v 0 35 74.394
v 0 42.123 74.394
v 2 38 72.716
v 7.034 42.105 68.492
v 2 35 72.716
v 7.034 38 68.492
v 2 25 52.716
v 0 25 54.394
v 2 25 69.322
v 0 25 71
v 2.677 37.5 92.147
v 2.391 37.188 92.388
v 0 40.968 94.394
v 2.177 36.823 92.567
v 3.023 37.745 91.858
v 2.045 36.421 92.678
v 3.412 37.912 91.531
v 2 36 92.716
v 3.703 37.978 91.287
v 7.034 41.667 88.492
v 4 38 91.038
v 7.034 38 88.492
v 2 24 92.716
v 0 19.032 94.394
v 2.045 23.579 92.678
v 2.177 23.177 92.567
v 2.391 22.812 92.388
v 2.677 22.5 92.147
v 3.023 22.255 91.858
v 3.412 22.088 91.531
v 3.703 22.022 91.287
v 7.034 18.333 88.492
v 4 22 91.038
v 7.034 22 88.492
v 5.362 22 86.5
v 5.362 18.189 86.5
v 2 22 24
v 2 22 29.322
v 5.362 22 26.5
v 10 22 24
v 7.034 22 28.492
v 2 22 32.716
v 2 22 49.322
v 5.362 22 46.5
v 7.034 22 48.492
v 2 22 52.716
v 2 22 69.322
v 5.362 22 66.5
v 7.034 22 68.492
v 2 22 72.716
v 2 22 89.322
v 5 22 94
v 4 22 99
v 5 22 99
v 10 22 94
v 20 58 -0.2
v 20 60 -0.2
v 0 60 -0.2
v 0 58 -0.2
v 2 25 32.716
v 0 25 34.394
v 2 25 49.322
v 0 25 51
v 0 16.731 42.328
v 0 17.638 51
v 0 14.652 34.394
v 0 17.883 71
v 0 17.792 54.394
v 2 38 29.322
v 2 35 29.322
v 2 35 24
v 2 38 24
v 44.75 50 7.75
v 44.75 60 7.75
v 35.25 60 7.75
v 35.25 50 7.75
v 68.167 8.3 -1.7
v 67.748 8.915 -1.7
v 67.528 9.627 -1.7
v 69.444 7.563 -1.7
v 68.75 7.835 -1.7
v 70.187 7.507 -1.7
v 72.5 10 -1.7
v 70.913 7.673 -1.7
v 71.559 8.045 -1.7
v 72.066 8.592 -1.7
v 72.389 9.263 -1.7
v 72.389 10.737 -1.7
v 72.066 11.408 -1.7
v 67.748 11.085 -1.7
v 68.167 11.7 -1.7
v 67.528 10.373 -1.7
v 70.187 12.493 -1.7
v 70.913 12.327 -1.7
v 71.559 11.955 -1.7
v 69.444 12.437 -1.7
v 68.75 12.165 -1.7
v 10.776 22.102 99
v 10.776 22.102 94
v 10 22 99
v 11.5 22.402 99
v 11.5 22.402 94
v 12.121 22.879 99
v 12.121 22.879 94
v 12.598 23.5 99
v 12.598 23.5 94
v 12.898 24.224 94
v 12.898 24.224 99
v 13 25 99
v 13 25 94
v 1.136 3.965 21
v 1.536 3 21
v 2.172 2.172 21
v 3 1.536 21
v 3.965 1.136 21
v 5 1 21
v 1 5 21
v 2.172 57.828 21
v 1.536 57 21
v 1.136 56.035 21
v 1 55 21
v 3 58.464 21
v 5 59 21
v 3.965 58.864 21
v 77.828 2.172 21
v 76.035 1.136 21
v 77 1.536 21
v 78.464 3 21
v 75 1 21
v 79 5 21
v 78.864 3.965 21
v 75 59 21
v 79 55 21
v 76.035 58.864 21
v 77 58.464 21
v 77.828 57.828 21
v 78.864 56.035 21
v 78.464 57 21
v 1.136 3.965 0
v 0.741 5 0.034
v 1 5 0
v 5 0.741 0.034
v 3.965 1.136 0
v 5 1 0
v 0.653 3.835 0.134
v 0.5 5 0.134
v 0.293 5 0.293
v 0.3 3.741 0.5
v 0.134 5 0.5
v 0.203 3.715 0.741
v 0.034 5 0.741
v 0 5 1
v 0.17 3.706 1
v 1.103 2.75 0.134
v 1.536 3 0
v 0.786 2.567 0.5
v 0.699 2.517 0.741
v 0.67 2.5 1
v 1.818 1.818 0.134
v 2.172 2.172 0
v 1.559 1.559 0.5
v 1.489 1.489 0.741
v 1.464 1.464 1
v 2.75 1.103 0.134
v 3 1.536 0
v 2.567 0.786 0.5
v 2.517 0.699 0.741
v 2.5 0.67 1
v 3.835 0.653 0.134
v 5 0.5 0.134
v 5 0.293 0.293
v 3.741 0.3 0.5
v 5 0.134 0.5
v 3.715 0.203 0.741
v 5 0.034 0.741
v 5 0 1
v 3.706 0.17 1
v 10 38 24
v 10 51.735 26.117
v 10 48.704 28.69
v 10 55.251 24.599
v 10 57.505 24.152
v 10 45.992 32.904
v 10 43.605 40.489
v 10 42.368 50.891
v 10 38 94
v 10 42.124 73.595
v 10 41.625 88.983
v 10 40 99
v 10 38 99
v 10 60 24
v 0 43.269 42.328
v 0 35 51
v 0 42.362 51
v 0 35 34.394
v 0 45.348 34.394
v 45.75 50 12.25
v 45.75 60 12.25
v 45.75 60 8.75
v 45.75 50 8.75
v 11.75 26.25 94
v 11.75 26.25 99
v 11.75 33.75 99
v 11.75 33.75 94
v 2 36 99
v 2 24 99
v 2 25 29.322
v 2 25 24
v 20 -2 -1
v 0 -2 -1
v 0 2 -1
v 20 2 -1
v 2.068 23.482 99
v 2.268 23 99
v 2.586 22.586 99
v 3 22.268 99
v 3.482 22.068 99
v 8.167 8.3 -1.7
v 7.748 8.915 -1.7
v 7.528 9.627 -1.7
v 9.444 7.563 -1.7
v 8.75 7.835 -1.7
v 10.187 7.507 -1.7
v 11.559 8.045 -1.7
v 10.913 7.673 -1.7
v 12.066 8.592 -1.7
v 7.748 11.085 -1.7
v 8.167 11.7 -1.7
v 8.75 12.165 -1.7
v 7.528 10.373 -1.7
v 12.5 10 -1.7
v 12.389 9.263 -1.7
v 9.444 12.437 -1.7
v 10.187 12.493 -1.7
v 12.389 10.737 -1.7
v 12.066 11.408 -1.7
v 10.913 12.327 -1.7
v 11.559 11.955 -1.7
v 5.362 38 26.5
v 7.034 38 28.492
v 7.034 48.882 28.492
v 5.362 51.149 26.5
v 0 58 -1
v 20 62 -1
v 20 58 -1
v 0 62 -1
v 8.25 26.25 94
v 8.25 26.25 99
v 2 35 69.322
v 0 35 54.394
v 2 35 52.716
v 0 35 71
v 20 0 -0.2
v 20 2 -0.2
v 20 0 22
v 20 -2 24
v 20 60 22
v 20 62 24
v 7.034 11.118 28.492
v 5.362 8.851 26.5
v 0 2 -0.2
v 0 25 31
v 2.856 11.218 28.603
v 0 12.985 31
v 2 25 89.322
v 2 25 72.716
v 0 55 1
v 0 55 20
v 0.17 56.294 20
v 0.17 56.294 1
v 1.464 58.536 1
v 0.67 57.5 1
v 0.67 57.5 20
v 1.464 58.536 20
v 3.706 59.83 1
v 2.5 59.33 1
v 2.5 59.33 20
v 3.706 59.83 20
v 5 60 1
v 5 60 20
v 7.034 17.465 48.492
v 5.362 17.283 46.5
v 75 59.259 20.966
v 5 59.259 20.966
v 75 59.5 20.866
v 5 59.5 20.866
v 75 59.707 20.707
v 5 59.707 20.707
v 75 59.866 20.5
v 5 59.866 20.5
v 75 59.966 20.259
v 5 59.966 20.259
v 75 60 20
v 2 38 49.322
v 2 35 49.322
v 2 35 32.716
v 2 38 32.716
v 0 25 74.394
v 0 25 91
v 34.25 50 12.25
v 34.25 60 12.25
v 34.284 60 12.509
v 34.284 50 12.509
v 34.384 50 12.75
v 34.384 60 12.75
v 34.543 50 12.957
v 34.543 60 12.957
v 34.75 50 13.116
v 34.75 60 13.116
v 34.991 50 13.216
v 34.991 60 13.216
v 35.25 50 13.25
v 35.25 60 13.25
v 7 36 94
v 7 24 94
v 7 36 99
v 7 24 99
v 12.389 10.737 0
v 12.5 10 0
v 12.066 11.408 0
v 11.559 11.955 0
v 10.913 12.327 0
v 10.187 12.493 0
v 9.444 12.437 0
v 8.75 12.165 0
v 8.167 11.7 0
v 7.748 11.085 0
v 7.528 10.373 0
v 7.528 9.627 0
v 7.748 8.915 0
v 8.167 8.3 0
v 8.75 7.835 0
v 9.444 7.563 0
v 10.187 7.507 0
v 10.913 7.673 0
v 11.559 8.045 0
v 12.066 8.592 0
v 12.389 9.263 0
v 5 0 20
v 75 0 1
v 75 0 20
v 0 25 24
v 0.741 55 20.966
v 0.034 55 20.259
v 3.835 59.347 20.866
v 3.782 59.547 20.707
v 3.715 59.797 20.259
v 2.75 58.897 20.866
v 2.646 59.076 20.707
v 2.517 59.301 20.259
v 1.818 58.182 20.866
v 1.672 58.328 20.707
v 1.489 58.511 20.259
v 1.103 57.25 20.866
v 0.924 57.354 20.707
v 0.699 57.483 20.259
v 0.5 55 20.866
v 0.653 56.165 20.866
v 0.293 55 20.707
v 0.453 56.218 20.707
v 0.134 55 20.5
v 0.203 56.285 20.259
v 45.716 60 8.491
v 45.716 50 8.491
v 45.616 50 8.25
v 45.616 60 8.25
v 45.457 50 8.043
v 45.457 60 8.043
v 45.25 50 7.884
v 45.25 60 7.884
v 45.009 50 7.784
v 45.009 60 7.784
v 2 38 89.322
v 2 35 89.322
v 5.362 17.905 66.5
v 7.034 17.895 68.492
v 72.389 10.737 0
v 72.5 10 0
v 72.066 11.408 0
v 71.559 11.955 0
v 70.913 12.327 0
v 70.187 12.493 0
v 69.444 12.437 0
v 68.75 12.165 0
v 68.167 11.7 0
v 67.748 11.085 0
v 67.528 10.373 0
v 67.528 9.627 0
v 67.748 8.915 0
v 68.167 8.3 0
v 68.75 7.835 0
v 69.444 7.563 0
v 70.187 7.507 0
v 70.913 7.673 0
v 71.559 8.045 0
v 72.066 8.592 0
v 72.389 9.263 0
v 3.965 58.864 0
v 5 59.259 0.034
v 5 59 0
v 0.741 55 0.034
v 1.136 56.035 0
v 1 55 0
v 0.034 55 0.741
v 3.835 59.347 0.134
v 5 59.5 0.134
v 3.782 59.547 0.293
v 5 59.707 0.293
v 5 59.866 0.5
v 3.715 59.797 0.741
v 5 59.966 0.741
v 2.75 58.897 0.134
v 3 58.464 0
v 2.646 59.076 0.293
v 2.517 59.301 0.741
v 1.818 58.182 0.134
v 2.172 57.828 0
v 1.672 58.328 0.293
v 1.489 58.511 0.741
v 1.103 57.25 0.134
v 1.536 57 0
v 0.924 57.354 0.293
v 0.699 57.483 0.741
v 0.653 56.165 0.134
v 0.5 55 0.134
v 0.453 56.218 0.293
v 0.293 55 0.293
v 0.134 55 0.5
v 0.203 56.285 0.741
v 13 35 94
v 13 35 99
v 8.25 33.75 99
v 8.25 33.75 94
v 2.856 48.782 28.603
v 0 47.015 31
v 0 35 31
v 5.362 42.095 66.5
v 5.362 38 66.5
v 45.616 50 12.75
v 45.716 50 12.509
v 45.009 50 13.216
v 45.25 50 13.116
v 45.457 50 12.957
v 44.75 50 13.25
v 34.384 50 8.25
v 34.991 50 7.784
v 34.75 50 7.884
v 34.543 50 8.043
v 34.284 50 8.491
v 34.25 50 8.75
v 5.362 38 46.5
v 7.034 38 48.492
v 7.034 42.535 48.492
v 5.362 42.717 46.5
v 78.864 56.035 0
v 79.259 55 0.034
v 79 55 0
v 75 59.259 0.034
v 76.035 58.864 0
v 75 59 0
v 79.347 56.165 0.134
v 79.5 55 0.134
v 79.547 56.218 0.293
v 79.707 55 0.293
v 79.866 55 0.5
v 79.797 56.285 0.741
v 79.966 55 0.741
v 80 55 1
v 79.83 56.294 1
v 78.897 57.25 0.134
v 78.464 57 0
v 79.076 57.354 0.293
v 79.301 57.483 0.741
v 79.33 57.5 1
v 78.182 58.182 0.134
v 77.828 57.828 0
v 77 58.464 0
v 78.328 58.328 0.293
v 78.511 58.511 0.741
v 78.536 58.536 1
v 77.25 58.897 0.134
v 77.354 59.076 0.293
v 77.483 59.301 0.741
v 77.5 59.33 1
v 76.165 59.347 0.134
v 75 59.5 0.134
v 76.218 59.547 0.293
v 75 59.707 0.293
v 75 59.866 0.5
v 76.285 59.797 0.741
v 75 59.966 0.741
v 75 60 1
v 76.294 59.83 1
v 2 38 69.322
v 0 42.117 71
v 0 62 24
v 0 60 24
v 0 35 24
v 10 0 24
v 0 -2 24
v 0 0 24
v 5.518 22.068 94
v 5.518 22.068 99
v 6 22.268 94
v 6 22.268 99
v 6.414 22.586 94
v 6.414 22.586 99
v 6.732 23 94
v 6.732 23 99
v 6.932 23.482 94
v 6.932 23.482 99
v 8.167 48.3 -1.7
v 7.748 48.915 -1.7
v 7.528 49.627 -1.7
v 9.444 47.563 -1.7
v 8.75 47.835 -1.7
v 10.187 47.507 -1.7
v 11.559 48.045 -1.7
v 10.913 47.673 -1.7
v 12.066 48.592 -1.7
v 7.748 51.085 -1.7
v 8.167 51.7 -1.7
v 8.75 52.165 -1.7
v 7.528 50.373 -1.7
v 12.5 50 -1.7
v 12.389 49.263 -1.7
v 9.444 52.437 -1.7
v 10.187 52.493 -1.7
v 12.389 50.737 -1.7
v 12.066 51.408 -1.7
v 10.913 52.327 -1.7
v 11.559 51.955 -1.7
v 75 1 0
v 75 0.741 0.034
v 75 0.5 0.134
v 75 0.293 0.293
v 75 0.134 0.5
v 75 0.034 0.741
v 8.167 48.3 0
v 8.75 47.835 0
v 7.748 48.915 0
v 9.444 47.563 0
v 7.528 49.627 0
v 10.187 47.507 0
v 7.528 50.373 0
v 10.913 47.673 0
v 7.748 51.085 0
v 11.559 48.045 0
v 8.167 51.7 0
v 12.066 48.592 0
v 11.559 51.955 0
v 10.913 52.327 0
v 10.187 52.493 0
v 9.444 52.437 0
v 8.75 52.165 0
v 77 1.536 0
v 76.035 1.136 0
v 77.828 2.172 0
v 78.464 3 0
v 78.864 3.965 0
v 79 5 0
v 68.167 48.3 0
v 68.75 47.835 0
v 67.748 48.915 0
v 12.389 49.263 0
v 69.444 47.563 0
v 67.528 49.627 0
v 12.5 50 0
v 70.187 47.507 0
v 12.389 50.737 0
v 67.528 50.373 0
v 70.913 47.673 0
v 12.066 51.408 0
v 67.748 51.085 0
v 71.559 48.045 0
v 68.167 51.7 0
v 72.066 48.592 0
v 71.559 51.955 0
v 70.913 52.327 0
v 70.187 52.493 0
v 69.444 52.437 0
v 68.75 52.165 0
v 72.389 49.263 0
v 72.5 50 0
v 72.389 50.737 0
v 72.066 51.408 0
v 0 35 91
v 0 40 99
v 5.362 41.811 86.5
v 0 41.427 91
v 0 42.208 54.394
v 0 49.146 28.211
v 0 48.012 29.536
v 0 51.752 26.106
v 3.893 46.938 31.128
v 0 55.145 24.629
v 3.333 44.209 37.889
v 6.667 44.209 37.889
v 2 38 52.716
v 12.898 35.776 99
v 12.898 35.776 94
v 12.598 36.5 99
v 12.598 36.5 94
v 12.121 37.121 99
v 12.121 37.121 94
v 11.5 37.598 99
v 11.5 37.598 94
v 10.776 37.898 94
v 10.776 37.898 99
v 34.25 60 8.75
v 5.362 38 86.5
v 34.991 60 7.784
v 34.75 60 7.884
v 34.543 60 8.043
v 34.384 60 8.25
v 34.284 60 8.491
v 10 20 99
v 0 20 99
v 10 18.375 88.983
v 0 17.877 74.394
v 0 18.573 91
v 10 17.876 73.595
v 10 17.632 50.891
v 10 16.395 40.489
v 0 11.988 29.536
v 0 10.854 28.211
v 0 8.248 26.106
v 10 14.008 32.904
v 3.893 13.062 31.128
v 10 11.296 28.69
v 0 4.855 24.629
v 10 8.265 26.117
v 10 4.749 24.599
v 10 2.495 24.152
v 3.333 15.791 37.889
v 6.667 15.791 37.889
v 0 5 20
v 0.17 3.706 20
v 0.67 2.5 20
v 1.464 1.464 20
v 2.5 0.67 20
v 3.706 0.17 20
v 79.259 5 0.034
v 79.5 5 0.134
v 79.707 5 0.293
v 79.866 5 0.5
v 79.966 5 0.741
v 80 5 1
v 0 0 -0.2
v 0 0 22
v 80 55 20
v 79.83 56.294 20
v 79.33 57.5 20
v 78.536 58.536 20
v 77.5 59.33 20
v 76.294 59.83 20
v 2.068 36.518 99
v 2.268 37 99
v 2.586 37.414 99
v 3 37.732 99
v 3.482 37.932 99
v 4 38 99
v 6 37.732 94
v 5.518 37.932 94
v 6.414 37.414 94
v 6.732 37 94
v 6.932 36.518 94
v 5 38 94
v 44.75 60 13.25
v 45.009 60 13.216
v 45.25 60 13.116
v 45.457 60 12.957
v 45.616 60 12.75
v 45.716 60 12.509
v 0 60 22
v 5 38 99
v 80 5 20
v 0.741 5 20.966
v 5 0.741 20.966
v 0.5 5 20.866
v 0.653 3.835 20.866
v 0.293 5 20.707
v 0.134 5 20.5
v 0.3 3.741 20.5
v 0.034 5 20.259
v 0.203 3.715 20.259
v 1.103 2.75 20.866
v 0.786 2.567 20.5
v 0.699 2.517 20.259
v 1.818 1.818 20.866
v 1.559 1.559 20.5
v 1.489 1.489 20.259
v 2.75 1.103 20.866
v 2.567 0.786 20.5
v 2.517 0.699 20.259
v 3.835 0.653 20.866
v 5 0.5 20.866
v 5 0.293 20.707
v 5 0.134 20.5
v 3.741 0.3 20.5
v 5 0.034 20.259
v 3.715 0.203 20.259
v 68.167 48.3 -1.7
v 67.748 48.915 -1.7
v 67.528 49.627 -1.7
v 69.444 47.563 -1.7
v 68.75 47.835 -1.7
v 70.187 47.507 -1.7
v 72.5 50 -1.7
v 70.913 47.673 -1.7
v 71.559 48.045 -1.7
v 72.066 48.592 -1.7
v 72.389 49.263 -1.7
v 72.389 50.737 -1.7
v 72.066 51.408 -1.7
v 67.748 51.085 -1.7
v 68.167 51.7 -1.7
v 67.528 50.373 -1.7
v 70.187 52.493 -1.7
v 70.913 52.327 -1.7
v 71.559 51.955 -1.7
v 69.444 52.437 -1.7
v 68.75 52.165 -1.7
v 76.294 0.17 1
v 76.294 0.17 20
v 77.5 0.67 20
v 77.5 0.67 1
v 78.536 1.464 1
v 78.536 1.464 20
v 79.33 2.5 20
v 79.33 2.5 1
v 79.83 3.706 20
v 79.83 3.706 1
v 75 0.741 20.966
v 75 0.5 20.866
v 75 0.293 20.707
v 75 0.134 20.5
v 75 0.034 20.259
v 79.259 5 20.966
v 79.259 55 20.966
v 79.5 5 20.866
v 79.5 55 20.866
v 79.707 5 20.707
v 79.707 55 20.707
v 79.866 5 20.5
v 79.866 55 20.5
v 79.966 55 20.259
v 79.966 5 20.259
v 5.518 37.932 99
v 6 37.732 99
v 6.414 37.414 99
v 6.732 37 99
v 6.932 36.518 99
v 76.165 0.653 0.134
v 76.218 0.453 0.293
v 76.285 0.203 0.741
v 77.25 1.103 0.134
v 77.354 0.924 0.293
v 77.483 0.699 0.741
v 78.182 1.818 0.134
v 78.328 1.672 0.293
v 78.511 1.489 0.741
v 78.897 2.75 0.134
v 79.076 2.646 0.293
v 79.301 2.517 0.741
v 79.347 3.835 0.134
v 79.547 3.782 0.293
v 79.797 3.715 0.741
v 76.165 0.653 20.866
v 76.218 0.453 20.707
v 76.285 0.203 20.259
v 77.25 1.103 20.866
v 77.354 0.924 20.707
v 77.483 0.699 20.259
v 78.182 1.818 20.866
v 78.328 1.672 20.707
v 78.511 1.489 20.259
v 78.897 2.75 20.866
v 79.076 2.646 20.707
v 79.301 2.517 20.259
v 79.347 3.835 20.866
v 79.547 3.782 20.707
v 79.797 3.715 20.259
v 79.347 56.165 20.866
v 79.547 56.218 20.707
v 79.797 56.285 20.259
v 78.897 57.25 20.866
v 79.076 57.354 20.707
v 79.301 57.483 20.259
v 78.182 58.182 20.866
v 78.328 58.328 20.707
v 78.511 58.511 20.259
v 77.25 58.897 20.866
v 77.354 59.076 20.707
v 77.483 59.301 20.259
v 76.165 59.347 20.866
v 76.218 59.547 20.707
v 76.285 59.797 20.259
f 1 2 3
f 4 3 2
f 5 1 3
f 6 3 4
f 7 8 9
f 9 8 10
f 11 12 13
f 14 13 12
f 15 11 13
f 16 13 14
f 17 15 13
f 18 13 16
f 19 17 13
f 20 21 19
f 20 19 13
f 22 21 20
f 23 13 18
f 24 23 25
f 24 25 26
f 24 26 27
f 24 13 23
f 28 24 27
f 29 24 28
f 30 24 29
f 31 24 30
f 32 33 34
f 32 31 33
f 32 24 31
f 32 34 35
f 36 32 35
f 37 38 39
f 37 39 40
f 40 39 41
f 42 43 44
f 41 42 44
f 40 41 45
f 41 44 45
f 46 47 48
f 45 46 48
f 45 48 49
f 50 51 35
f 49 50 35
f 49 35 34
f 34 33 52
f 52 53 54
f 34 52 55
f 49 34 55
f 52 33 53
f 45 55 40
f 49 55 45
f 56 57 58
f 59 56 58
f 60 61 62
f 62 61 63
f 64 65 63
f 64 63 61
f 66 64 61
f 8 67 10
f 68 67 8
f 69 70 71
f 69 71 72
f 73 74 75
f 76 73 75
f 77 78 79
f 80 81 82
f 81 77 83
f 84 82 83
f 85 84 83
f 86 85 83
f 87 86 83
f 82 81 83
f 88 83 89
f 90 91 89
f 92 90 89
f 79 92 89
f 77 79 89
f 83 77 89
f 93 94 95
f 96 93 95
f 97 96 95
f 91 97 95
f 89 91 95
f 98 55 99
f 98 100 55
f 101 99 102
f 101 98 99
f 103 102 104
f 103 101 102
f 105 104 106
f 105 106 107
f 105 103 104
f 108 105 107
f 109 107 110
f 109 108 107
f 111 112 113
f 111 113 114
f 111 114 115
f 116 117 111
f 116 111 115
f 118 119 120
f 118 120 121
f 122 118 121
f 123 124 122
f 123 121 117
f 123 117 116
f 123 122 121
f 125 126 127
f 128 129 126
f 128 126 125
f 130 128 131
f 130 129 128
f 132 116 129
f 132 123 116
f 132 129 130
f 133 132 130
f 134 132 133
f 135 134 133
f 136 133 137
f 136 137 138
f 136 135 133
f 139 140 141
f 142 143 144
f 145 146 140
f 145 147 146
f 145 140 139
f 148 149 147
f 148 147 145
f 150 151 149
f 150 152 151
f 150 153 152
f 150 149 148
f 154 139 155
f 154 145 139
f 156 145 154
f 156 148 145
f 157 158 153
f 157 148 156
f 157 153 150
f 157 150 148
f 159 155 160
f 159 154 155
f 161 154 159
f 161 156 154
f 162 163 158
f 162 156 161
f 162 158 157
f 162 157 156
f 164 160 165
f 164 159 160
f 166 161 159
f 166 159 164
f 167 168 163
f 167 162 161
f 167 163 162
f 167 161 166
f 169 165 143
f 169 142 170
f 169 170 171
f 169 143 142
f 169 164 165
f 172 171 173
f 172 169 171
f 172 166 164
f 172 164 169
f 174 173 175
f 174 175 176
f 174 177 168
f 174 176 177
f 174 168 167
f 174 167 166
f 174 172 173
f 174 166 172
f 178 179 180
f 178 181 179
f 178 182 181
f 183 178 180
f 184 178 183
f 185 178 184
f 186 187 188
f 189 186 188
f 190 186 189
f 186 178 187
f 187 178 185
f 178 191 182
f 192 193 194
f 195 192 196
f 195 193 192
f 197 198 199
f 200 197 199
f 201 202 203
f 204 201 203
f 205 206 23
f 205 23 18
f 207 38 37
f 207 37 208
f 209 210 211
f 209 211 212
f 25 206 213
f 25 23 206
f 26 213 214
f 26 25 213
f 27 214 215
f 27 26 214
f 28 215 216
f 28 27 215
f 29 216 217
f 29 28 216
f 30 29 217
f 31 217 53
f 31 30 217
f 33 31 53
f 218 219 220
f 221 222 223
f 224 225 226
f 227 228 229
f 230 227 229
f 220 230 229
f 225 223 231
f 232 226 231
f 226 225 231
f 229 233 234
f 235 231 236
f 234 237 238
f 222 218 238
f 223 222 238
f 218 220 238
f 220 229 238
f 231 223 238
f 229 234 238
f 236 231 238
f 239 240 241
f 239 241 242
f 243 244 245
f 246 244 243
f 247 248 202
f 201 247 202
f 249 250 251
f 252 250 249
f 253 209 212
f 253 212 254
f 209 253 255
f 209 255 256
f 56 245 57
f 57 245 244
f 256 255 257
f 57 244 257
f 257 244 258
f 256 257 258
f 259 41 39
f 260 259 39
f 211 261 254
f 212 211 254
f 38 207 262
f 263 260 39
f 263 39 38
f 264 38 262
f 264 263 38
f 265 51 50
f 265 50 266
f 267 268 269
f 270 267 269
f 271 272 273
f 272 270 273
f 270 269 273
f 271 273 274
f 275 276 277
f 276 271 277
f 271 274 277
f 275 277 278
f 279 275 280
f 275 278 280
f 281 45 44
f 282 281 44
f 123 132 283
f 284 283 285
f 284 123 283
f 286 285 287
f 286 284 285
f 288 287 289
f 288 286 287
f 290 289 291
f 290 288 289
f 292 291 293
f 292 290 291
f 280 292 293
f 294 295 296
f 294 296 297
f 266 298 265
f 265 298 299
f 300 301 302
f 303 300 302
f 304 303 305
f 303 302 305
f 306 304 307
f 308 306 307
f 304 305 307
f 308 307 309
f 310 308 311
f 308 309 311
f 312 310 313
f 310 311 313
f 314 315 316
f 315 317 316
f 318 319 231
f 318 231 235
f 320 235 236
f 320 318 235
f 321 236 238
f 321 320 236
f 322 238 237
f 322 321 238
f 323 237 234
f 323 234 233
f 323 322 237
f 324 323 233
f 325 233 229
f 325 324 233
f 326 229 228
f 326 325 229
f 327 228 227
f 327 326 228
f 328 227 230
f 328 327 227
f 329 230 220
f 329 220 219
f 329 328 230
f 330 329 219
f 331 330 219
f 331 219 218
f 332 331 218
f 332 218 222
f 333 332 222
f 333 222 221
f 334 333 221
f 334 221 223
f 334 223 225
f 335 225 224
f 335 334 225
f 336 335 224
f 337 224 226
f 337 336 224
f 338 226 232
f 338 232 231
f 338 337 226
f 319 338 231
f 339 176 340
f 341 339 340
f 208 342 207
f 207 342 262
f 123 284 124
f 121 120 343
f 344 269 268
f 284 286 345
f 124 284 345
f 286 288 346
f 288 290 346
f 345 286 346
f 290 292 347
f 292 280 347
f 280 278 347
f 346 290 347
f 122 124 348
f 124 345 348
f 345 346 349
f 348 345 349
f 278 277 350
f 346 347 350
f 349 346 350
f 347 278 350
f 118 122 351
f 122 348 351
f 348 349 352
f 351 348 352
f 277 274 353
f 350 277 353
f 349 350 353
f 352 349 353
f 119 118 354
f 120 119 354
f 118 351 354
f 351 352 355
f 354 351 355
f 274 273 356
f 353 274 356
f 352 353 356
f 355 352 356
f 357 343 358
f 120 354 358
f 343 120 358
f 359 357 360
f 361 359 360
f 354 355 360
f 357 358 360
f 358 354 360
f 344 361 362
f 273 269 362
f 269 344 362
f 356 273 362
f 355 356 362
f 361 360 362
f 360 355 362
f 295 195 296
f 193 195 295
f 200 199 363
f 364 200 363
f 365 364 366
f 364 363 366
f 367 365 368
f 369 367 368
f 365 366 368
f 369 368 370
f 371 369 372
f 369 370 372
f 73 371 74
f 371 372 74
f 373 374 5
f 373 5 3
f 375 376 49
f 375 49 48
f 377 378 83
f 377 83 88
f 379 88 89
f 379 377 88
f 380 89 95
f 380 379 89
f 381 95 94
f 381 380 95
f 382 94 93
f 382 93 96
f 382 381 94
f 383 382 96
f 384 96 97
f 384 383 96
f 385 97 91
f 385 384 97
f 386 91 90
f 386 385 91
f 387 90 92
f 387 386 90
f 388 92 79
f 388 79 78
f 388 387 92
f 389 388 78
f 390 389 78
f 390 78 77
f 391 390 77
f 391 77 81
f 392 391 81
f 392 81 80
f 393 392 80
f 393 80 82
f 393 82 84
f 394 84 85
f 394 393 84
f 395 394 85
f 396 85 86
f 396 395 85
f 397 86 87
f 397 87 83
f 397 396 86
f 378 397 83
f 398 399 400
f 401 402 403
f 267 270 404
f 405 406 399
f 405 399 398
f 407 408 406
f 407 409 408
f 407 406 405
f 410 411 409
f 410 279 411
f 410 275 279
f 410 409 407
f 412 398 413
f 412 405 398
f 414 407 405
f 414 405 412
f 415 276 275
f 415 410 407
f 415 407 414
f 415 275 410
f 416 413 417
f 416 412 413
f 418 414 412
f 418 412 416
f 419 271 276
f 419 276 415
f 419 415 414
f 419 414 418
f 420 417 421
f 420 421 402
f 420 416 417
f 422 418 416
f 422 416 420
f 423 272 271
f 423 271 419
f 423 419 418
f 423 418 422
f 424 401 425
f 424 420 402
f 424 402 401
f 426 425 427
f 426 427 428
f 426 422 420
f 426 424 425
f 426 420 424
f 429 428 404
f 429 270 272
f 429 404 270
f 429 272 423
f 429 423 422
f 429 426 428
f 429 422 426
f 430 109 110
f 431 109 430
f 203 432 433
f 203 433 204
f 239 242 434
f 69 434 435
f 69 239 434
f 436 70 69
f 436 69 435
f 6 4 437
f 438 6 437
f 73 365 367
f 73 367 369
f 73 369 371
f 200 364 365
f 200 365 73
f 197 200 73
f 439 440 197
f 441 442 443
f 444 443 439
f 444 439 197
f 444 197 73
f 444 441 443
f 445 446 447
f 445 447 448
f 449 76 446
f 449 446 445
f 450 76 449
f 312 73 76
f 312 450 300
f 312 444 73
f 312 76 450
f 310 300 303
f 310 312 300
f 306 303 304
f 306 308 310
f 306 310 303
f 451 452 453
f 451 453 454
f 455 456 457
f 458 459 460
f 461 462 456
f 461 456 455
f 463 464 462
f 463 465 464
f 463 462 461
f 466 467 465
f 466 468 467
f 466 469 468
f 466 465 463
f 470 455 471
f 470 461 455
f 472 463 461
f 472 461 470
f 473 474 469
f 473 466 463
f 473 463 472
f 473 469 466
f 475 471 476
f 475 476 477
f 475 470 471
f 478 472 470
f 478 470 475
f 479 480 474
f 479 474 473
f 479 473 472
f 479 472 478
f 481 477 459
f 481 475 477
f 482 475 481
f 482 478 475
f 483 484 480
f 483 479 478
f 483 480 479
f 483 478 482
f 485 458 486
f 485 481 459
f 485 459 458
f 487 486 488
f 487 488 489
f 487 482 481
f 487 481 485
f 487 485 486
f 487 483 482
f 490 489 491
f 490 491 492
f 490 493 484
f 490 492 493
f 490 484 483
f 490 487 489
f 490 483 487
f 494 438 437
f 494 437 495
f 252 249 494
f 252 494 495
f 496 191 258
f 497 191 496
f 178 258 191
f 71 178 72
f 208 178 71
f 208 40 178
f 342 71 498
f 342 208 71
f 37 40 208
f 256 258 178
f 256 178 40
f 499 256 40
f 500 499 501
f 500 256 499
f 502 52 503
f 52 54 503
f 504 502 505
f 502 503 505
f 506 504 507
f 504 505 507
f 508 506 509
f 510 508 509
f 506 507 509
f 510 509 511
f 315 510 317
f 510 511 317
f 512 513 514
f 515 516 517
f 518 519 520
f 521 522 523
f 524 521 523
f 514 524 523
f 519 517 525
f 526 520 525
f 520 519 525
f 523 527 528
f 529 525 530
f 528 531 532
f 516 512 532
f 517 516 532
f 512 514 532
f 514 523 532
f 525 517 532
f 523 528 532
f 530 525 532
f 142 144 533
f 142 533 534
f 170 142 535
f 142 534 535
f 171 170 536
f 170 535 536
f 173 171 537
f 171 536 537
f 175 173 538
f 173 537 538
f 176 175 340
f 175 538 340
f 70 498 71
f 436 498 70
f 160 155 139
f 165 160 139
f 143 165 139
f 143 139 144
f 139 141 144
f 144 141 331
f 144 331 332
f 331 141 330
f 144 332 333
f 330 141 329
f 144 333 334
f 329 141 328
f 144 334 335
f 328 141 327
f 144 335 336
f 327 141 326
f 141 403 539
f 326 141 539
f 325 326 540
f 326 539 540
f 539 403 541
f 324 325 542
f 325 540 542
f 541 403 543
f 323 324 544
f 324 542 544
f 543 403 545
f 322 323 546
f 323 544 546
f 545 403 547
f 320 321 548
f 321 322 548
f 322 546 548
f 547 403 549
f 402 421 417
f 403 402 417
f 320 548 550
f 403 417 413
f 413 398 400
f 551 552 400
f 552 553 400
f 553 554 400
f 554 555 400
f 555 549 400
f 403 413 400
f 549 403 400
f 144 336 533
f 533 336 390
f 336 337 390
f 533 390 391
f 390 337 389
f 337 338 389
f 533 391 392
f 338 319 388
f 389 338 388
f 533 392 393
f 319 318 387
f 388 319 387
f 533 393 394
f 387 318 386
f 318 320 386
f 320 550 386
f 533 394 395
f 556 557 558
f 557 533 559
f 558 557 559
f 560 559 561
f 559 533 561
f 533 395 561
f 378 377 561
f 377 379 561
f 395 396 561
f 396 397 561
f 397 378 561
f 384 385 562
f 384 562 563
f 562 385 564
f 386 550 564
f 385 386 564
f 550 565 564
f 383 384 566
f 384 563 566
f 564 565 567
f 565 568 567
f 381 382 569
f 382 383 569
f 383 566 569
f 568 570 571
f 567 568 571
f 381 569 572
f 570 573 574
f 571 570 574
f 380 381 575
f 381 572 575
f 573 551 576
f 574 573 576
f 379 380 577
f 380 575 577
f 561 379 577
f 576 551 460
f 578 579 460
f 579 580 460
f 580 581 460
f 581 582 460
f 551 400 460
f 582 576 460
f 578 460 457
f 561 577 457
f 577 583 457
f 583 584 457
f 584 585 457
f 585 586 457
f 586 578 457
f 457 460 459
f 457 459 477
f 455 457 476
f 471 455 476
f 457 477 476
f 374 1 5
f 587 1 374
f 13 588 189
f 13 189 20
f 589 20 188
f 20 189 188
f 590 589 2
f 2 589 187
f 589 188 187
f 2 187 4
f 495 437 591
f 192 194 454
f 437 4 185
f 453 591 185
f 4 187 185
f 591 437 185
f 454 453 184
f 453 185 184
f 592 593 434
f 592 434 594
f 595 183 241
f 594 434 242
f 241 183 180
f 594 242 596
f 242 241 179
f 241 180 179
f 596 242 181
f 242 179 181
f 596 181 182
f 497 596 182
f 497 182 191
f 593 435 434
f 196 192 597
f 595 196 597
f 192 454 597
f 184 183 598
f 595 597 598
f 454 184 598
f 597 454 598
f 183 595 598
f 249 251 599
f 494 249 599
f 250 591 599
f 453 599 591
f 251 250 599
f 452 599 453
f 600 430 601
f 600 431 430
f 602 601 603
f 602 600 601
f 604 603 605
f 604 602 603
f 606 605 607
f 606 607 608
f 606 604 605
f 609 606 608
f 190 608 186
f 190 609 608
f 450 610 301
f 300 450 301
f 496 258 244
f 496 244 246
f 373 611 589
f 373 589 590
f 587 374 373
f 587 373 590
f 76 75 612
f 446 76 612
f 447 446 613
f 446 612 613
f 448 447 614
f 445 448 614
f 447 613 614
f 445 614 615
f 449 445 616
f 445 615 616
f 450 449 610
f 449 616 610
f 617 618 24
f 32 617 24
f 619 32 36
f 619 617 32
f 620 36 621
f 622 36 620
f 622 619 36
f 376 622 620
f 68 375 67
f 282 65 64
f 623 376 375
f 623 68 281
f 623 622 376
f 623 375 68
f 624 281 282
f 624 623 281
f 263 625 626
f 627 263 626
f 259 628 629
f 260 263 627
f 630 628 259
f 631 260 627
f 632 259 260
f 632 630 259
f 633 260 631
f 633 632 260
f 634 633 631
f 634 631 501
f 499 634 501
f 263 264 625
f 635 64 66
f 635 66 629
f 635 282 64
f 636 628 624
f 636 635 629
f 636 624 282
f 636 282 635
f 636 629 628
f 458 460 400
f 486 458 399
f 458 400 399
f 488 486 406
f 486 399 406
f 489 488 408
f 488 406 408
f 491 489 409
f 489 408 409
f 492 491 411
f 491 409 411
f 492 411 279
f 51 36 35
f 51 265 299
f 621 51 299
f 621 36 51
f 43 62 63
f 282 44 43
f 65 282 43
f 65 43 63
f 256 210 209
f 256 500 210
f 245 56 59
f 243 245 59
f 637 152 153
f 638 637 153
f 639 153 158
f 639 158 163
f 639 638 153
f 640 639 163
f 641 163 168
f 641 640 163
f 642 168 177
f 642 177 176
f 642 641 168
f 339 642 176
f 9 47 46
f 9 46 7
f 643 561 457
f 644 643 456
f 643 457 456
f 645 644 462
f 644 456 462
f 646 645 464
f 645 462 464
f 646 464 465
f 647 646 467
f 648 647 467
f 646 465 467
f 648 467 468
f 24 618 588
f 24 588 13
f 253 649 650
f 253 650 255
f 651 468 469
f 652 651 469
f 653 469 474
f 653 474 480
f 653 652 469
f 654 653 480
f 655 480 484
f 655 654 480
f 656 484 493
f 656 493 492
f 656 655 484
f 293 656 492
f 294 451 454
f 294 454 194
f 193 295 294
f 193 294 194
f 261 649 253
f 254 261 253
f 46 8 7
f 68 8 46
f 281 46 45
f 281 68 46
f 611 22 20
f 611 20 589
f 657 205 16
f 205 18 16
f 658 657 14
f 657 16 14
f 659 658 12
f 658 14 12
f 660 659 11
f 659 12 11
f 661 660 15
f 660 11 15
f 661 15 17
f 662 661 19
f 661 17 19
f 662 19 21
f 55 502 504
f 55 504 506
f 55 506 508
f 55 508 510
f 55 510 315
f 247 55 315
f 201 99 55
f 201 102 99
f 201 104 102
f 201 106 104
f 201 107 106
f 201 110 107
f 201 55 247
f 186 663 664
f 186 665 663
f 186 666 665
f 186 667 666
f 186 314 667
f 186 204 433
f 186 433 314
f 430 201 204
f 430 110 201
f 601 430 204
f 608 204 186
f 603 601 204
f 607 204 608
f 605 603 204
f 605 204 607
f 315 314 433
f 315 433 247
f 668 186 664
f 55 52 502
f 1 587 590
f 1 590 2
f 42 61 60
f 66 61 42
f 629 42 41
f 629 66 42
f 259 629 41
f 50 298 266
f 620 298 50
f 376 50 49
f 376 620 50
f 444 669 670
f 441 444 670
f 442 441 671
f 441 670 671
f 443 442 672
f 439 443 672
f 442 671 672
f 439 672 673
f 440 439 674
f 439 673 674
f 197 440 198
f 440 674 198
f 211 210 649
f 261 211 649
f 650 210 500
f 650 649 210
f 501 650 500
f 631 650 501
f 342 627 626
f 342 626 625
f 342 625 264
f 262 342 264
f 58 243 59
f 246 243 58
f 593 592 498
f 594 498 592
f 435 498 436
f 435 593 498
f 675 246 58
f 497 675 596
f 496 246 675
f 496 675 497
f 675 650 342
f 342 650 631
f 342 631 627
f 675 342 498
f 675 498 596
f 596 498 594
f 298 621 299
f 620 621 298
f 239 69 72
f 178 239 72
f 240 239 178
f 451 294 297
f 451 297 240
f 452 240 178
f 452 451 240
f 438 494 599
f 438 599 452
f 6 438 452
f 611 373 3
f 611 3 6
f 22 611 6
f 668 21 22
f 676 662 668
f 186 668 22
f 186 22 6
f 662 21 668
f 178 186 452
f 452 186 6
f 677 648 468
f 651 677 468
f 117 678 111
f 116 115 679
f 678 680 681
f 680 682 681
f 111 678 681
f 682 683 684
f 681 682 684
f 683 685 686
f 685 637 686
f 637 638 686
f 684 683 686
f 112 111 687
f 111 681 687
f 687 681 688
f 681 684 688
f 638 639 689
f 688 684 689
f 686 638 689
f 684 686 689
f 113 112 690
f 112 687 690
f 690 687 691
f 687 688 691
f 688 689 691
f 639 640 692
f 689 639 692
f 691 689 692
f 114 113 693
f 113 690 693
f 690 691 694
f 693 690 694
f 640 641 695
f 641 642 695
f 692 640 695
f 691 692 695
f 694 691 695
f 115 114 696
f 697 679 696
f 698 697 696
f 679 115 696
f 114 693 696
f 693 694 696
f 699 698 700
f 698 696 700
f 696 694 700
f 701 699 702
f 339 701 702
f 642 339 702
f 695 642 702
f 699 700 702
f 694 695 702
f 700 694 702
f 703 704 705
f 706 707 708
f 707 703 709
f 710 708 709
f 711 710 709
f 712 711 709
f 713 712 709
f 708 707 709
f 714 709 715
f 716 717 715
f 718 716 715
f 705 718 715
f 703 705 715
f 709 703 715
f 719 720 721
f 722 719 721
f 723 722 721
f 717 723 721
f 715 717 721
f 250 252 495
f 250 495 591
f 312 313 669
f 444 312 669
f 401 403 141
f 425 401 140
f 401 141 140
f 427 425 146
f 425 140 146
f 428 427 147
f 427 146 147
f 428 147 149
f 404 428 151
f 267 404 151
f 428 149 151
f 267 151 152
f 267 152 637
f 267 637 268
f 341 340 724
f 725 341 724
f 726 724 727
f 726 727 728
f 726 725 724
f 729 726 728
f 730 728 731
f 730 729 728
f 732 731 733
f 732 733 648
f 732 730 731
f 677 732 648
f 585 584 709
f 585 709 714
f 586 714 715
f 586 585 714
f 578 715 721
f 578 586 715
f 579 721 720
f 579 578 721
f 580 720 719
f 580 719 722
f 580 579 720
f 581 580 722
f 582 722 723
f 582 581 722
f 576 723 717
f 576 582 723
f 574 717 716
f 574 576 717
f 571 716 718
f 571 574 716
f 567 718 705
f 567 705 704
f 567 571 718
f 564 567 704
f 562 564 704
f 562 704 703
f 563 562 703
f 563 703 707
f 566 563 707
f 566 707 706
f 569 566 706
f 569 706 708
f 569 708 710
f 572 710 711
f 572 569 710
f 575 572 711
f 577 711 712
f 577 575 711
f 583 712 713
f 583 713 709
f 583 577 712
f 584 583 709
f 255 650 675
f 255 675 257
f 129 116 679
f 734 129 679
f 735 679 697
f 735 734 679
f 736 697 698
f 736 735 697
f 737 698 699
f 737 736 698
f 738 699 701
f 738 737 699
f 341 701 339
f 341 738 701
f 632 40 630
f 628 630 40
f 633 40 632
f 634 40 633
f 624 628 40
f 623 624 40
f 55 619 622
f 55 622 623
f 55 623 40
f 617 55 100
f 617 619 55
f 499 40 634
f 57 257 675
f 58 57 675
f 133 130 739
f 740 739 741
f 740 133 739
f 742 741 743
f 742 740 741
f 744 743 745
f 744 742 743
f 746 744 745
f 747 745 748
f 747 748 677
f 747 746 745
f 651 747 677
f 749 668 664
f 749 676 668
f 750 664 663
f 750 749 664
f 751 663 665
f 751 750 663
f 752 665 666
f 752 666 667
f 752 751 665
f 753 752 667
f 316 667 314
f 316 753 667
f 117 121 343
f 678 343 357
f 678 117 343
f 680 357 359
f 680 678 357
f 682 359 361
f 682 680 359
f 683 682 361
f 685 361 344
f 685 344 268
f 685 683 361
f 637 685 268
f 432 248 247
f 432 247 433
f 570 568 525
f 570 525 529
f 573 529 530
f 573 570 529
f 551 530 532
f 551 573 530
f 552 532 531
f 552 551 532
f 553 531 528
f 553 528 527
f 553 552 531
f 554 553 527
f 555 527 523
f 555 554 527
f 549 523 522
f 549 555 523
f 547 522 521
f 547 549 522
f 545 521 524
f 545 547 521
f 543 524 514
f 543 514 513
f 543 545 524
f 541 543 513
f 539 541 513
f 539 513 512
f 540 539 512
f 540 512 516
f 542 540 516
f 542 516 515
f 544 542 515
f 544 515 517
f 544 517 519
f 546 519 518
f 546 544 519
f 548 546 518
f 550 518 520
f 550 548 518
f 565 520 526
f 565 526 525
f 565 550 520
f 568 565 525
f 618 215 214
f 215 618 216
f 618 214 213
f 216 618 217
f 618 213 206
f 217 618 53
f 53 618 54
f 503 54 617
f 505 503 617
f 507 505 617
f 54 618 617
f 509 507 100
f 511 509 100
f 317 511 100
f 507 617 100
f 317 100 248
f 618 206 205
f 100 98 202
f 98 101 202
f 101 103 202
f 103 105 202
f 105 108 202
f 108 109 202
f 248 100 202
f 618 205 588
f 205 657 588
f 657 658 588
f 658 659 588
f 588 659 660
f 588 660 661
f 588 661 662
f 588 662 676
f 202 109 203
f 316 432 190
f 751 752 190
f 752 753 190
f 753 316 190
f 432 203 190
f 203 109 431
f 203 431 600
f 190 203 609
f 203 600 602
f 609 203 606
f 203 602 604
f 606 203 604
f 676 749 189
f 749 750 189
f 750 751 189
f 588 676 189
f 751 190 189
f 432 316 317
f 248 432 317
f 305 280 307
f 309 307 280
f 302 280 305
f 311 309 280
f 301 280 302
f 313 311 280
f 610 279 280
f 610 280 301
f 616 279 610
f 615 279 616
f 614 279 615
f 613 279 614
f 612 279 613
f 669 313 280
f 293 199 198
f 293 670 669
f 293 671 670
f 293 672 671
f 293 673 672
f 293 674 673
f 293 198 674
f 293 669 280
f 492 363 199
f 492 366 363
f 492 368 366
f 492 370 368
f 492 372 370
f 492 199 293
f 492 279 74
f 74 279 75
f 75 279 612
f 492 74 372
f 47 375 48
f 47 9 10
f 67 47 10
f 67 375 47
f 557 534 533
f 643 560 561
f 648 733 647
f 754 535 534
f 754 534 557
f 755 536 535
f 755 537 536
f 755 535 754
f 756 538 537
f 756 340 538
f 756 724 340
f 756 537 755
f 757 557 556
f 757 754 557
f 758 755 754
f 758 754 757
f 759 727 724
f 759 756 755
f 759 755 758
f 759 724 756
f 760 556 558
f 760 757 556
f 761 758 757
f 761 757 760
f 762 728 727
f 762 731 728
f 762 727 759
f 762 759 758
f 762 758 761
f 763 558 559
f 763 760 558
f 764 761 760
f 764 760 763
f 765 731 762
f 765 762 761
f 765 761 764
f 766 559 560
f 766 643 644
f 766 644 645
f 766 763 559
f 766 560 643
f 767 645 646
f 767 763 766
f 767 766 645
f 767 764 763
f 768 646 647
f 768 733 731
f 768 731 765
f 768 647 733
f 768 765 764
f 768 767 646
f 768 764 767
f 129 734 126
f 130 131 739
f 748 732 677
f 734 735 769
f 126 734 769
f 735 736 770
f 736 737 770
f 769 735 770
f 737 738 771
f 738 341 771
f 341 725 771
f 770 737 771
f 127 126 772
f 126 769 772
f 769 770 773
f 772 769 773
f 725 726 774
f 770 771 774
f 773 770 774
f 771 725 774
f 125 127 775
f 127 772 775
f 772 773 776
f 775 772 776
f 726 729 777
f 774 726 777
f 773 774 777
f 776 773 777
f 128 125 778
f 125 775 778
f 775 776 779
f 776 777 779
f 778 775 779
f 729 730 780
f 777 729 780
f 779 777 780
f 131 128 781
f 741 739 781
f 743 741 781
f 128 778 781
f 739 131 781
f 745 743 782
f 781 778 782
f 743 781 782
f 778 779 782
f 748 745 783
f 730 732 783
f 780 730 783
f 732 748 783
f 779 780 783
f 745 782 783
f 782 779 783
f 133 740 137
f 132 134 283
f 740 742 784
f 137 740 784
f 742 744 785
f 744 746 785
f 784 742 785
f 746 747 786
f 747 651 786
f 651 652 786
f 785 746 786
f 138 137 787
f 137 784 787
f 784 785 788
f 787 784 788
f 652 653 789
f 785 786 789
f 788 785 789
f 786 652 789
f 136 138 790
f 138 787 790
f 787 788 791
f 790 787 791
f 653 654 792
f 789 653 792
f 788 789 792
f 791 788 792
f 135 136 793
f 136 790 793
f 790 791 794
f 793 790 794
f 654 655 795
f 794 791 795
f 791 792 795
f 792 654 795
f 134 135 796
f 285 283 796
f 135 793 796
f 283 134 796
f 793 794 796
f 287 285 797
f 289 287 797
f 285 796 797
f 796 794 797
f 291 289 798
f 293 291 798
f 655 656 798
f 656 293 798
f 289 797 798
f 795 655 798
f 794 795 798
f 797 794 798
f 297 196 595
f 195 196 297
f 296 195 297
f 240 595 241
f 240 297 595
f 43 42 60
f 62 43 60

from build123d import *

# Parameters (mm, degrees)
F0_W      = 80
F0_H      = 60
F0_R      = 2.5
F1_DEPTH  = 21
F2_R      = 5
F3_R      = 1
F5_DEPTH  = 10
F6_DEPTH  = 1.7
F7_W      = 20
F7_H      = 0.8
F7_H_2    = 22.2
F8_DEPTH  = 2
F9_DEPTH  = 60
F10_W     = 20
F10_H     = 2
F10_H_2   = 22.2
F10_H_3   = 0.8
F11_DEPTH = 2
F13_DEPTH = 25
F14_W     = 8
F14_H     = 16
F15_DEPTH = 75
F16_W     = 16
F16_H     = 5
F17_DEPTH = 3
F18_R     = 2.99999
F19_W     = 3.5
F19_H     = 7.5
F20_DEPTH = 5
F21_W     = 10
F21_H     = 67
F22_DEPTH = 25
F23_DEPTH = 2
F24_DEPTH = 2
F25_R     = 2


# Not quite as in the source:
# - a fillet or chamfer is up to 0.001 mm smaller than in the source, because OpenCascade refuses the exact size


with BuildPart() as f1:
    # F0 (on Top) → F1 (new body)
    with BuildSketch(Plane.XY):
        with Locations((40, 30)):
            Rectangle(F0_W, F0_H)
        with Locations((10, 10)):
            Circle(F0_R, mode=Mode.SUBTRACT)
        with Locations((70, 10)):
            Circle(F0_R, mode=Mode.SUBTRACT)
        with Locations((10, 50)):
            Circle(F0_R, mode=Mode.SUBTRACT)
        with Locations((70, 50)):
            Circle(F0_R, mode=Mode.SUBTRACT)
        with Locations((10, 10)):
            Circle(F0_R)
        with Locations((70, 10)):
            Circle(F0_R)
        with Locations((70, 50)):
            Circle(F0_R)
        with Locations((10, 50)):
            Circle(F0_R)
    extrude(amount=F1_DEPTH)

    # F2
    f2_edges = [f1.edges().sort_by_distance(p)[0] for p in [
        (0, 0, 10.5),
        (80, 0, 10.5),
        (80, 60, 10.5),
        (0, 60, 10.5),
    ]]
    fillet(f2_edges, radius=F2_R)

    # F3
    f3_edges = [f1.edges().sort_by_distance(p)[0] for p in [
        (40, 0, 21),
        (40, 0, 0),
        (0, 30, 0),
        (0, 30, 21),
        (1.464466, 58.535534, 0),
        (1.464466, 1.464466, 0),
        (78.535534, 58.535534, 0),
        (78.535534, 1.464466, 0),
        (80, 30, 0),
        (1.464466, 58.535534, 21),
        (1.464466, 1.464466, 21),
        (78.535534, 58.535534, 21),
        (78.535534, 1.464466, 21),
        (80, 30, 21),
    ]]
    fillet(f3_edges, radius=F3_R)

    # F4 (on face) → F5 (cut)
    with BuildSketch(Plane(origin=(0, 60, 0), x_dir=(-1, 0, 0), z_dir=(0, 1, 0))):
        with BuildLine():
            Line((-35.25, 13.25), (-44.75, 13.25))
            ThreePointArc((-44.75, 13.25), (-45.4571067812, 12.9571067812), (-45.75, 12.25))
            Line((-45.75, 12.25), (-45.75, 8.75))
            ThreePointArc((-45.75, 8.75), (-45.4571067812, 8.0428932188), (-44.75, 7.75))
            Line((-44.75, 7.75), (-35.25, 7.75))
            ThreePointArc((-35.25, 7.75), (-34.5428932188, 8.0428932188), (-34.25, 8.75))
            Line((-34.25, 8.75), (-34.25, 12.25))
            ThreePointArc((-34.25, 12.25), (-34.5428932188, 12.9571067812), (-35.25, 13.25))
        make_face()
    extrude(amount=-F5_DEPTH, mode=Mode.SUBTRACT)

    # F0 (on Top) → F6 (join)
    with BuildSketch(Plane.XY):
        with Locations((10, 10)):
            Circle(F0_R)
        with Locations((70, 10)):
            Circle(F0_R)
        with Locations((70, 50)):
            Circle(F0_R)
        with Locations((10, 50)):
            Circle(F0_R)
    extrude(amount=-F6_DEPTH)


with BuildPart() as f8:
    # F7 (on Front) → F8 (new body)
    with BuildSketch(Plane.XZ):
        with Locations((10, -0.6)):
            Rectangle(F7_W, F7_H)
        Polygon((0, 24), (0, 22), (20, 22), (20, 24), (10, 24), align=None)
        with Locations((10, 10.9)):
            Rectangle(F7_W, F7_H_2)
    extrude(amount=F8_DEPTH)

    # F7 (on Front) → F9 (join, through all)
    with BuildSketch(Plane.XZ):
        Polygon((0, 24), (0, 22), (20, 22), (20, 24), (10, 24), align=None)
        Polygon((0, 31), (0, 24), (10, 24), (10, 99), (0, 99), (0, 94.3940589523), (7.033558887, 88.4922022843), (5.3623111018, 86.5004867322), (0, 91), (0, 74.3940589523), (7.033558887, 68.4922022843), (5.3623111018, 66.5004867322), (0, 71), (0, 54.3940589523), (7.033558887, 48.4922022843), (5.3623111018, 46.5004867322), (0, 51), (0, 34.3940589523), (7.033558887, 28.4922022843), (5.3623111018, 26.5004867322), align=None)
    extrude(amount=-F9_DEPTH)

    # F10 (on face) → F11 (join)
    with BuildSketch(Plane(origin=(0, 60, 0), x_dir=(-1, 0, 0), z_dir=(0, 1, 0))):
        with Locations((-10, 23)):
            Rectangle(F10_W, F10_H)
        with Locations((-10, 10.9)):
            Rectangle(F10_W, F10_H_2)
        with Locations((-10, -0.6)):
            Rectangle(F10_W, F10_H_3)
    extrude(amount=F11_DEPTH)

    # F12 (on face) → F13 (cut)
    with BuildSketch(Plane.YZ.offset(10)):
        with BuildLine():
            Line((0, 99), (0, 24))
            add(Edge.make_bspline(
                [(20, 99), (13.3333333333, 74), (27.1956510843, 24), (0, 24)],
                knots=[0, 0, 0, 0, 77.6208734813, 77.6208734813, 77.6208734813, 77.6208734813], degree=3))
            Line((20, 99), (3e-10, 99))
        make_face()
        with BuildLine():
            add(Edge.make_bspline(
                [(40, 99), (46.6666666667, 74), (32.8043489157, 24), (60, 24)],
                knots=[0, 0, 0, 0, 77.6208734813, 77.6208734813, 77.6208734813, 77.6208734813], degree=3))
            Line((60, 24), (60, 99))
            Line((60, 99), (40, 99))
        make_face()
    extrude(amount=-F13_DEPTH, mode=Mode.SUBTRACT)

    # F14 (on face) → F15 (cut, through all)
    with BuildSketch(Plane.XY.offset(99)):
        with Locations((6, 30)):
            Rectangle(F14_W, F14_H)
    extrude(amount=-F15_DEPTH, mode=Mode.SUBTRACT)

    # F16 (on face) → F17 (join, symmetric)
    with BuildSketch(Plane.YZ.offset(10)):
        with Locations((30, 96.5)):
            Rectangle(F16_W, F16_H)
    extrude(amount=F17_DEPTH, both=True)

    # F18 (radius 3 in the source; OpenCascade refuses exactly that, so slightly less here)
    f18_edges = [f8.edges().sort_by_distance(p)[0] for p in [
        (13, 22, 96.5),
        (13, 38, 96.5),
    ]]
    fillet(f18_edges, radius=F18_R)

    # F19 (on face) → F20 (cut, through all)
    with BuildSketch(Plane.XY.offset(99)):
        with Locations((10, 30)):
            Rectangle(F19_W, F19_H)
    extrude(amount=-F20_DEPTH, mode=Mode.SUBTRACT)

    # F21 (on face) → F22 (cut)
    with BuildSketch(Plane(origin=(0, 0, 0), x_dir=(0, -1, 0), z_dir=(-1, 0, 0))):
        with Locations((-30, 57.5)):
            Rectangle(F21_W, F21_H)
    extrude(amount=-F22_DEPTH, mode=Mode.SUBTRACT)

    # F7 (on Front) → F23 (join)
    with BuildSketch(Plane.XZ):
        with Locations((10, -0.6)):
            Rectangle(F7_W, F7_H)
    extrude(amount=-F23_DEPTH)

    # F10 (on face) → F24 (join)
    with BuildSketch(Plane(origin=(0, 60, 0), x_dir=(-1, 0, 0), z_dir=(0, 1, 0))):
        with Locations((-10, -0.6)):
            Rectangle(F10_W, F10_H_3)
    extrude(amount=-F24_DEPTH)

    # F25
    f25_edges = [f8.edges().sort_by_distance(p)[0] for p in [
        (7, 38, 96.5),
        (2, 38, 95.85793),
        (2, 22, 95.85793),
        (7, 22, 96.5),
    ]]
    fillet(f25_edges, radius=F25_R)


solid = Compound([f1.part, f8.part])
